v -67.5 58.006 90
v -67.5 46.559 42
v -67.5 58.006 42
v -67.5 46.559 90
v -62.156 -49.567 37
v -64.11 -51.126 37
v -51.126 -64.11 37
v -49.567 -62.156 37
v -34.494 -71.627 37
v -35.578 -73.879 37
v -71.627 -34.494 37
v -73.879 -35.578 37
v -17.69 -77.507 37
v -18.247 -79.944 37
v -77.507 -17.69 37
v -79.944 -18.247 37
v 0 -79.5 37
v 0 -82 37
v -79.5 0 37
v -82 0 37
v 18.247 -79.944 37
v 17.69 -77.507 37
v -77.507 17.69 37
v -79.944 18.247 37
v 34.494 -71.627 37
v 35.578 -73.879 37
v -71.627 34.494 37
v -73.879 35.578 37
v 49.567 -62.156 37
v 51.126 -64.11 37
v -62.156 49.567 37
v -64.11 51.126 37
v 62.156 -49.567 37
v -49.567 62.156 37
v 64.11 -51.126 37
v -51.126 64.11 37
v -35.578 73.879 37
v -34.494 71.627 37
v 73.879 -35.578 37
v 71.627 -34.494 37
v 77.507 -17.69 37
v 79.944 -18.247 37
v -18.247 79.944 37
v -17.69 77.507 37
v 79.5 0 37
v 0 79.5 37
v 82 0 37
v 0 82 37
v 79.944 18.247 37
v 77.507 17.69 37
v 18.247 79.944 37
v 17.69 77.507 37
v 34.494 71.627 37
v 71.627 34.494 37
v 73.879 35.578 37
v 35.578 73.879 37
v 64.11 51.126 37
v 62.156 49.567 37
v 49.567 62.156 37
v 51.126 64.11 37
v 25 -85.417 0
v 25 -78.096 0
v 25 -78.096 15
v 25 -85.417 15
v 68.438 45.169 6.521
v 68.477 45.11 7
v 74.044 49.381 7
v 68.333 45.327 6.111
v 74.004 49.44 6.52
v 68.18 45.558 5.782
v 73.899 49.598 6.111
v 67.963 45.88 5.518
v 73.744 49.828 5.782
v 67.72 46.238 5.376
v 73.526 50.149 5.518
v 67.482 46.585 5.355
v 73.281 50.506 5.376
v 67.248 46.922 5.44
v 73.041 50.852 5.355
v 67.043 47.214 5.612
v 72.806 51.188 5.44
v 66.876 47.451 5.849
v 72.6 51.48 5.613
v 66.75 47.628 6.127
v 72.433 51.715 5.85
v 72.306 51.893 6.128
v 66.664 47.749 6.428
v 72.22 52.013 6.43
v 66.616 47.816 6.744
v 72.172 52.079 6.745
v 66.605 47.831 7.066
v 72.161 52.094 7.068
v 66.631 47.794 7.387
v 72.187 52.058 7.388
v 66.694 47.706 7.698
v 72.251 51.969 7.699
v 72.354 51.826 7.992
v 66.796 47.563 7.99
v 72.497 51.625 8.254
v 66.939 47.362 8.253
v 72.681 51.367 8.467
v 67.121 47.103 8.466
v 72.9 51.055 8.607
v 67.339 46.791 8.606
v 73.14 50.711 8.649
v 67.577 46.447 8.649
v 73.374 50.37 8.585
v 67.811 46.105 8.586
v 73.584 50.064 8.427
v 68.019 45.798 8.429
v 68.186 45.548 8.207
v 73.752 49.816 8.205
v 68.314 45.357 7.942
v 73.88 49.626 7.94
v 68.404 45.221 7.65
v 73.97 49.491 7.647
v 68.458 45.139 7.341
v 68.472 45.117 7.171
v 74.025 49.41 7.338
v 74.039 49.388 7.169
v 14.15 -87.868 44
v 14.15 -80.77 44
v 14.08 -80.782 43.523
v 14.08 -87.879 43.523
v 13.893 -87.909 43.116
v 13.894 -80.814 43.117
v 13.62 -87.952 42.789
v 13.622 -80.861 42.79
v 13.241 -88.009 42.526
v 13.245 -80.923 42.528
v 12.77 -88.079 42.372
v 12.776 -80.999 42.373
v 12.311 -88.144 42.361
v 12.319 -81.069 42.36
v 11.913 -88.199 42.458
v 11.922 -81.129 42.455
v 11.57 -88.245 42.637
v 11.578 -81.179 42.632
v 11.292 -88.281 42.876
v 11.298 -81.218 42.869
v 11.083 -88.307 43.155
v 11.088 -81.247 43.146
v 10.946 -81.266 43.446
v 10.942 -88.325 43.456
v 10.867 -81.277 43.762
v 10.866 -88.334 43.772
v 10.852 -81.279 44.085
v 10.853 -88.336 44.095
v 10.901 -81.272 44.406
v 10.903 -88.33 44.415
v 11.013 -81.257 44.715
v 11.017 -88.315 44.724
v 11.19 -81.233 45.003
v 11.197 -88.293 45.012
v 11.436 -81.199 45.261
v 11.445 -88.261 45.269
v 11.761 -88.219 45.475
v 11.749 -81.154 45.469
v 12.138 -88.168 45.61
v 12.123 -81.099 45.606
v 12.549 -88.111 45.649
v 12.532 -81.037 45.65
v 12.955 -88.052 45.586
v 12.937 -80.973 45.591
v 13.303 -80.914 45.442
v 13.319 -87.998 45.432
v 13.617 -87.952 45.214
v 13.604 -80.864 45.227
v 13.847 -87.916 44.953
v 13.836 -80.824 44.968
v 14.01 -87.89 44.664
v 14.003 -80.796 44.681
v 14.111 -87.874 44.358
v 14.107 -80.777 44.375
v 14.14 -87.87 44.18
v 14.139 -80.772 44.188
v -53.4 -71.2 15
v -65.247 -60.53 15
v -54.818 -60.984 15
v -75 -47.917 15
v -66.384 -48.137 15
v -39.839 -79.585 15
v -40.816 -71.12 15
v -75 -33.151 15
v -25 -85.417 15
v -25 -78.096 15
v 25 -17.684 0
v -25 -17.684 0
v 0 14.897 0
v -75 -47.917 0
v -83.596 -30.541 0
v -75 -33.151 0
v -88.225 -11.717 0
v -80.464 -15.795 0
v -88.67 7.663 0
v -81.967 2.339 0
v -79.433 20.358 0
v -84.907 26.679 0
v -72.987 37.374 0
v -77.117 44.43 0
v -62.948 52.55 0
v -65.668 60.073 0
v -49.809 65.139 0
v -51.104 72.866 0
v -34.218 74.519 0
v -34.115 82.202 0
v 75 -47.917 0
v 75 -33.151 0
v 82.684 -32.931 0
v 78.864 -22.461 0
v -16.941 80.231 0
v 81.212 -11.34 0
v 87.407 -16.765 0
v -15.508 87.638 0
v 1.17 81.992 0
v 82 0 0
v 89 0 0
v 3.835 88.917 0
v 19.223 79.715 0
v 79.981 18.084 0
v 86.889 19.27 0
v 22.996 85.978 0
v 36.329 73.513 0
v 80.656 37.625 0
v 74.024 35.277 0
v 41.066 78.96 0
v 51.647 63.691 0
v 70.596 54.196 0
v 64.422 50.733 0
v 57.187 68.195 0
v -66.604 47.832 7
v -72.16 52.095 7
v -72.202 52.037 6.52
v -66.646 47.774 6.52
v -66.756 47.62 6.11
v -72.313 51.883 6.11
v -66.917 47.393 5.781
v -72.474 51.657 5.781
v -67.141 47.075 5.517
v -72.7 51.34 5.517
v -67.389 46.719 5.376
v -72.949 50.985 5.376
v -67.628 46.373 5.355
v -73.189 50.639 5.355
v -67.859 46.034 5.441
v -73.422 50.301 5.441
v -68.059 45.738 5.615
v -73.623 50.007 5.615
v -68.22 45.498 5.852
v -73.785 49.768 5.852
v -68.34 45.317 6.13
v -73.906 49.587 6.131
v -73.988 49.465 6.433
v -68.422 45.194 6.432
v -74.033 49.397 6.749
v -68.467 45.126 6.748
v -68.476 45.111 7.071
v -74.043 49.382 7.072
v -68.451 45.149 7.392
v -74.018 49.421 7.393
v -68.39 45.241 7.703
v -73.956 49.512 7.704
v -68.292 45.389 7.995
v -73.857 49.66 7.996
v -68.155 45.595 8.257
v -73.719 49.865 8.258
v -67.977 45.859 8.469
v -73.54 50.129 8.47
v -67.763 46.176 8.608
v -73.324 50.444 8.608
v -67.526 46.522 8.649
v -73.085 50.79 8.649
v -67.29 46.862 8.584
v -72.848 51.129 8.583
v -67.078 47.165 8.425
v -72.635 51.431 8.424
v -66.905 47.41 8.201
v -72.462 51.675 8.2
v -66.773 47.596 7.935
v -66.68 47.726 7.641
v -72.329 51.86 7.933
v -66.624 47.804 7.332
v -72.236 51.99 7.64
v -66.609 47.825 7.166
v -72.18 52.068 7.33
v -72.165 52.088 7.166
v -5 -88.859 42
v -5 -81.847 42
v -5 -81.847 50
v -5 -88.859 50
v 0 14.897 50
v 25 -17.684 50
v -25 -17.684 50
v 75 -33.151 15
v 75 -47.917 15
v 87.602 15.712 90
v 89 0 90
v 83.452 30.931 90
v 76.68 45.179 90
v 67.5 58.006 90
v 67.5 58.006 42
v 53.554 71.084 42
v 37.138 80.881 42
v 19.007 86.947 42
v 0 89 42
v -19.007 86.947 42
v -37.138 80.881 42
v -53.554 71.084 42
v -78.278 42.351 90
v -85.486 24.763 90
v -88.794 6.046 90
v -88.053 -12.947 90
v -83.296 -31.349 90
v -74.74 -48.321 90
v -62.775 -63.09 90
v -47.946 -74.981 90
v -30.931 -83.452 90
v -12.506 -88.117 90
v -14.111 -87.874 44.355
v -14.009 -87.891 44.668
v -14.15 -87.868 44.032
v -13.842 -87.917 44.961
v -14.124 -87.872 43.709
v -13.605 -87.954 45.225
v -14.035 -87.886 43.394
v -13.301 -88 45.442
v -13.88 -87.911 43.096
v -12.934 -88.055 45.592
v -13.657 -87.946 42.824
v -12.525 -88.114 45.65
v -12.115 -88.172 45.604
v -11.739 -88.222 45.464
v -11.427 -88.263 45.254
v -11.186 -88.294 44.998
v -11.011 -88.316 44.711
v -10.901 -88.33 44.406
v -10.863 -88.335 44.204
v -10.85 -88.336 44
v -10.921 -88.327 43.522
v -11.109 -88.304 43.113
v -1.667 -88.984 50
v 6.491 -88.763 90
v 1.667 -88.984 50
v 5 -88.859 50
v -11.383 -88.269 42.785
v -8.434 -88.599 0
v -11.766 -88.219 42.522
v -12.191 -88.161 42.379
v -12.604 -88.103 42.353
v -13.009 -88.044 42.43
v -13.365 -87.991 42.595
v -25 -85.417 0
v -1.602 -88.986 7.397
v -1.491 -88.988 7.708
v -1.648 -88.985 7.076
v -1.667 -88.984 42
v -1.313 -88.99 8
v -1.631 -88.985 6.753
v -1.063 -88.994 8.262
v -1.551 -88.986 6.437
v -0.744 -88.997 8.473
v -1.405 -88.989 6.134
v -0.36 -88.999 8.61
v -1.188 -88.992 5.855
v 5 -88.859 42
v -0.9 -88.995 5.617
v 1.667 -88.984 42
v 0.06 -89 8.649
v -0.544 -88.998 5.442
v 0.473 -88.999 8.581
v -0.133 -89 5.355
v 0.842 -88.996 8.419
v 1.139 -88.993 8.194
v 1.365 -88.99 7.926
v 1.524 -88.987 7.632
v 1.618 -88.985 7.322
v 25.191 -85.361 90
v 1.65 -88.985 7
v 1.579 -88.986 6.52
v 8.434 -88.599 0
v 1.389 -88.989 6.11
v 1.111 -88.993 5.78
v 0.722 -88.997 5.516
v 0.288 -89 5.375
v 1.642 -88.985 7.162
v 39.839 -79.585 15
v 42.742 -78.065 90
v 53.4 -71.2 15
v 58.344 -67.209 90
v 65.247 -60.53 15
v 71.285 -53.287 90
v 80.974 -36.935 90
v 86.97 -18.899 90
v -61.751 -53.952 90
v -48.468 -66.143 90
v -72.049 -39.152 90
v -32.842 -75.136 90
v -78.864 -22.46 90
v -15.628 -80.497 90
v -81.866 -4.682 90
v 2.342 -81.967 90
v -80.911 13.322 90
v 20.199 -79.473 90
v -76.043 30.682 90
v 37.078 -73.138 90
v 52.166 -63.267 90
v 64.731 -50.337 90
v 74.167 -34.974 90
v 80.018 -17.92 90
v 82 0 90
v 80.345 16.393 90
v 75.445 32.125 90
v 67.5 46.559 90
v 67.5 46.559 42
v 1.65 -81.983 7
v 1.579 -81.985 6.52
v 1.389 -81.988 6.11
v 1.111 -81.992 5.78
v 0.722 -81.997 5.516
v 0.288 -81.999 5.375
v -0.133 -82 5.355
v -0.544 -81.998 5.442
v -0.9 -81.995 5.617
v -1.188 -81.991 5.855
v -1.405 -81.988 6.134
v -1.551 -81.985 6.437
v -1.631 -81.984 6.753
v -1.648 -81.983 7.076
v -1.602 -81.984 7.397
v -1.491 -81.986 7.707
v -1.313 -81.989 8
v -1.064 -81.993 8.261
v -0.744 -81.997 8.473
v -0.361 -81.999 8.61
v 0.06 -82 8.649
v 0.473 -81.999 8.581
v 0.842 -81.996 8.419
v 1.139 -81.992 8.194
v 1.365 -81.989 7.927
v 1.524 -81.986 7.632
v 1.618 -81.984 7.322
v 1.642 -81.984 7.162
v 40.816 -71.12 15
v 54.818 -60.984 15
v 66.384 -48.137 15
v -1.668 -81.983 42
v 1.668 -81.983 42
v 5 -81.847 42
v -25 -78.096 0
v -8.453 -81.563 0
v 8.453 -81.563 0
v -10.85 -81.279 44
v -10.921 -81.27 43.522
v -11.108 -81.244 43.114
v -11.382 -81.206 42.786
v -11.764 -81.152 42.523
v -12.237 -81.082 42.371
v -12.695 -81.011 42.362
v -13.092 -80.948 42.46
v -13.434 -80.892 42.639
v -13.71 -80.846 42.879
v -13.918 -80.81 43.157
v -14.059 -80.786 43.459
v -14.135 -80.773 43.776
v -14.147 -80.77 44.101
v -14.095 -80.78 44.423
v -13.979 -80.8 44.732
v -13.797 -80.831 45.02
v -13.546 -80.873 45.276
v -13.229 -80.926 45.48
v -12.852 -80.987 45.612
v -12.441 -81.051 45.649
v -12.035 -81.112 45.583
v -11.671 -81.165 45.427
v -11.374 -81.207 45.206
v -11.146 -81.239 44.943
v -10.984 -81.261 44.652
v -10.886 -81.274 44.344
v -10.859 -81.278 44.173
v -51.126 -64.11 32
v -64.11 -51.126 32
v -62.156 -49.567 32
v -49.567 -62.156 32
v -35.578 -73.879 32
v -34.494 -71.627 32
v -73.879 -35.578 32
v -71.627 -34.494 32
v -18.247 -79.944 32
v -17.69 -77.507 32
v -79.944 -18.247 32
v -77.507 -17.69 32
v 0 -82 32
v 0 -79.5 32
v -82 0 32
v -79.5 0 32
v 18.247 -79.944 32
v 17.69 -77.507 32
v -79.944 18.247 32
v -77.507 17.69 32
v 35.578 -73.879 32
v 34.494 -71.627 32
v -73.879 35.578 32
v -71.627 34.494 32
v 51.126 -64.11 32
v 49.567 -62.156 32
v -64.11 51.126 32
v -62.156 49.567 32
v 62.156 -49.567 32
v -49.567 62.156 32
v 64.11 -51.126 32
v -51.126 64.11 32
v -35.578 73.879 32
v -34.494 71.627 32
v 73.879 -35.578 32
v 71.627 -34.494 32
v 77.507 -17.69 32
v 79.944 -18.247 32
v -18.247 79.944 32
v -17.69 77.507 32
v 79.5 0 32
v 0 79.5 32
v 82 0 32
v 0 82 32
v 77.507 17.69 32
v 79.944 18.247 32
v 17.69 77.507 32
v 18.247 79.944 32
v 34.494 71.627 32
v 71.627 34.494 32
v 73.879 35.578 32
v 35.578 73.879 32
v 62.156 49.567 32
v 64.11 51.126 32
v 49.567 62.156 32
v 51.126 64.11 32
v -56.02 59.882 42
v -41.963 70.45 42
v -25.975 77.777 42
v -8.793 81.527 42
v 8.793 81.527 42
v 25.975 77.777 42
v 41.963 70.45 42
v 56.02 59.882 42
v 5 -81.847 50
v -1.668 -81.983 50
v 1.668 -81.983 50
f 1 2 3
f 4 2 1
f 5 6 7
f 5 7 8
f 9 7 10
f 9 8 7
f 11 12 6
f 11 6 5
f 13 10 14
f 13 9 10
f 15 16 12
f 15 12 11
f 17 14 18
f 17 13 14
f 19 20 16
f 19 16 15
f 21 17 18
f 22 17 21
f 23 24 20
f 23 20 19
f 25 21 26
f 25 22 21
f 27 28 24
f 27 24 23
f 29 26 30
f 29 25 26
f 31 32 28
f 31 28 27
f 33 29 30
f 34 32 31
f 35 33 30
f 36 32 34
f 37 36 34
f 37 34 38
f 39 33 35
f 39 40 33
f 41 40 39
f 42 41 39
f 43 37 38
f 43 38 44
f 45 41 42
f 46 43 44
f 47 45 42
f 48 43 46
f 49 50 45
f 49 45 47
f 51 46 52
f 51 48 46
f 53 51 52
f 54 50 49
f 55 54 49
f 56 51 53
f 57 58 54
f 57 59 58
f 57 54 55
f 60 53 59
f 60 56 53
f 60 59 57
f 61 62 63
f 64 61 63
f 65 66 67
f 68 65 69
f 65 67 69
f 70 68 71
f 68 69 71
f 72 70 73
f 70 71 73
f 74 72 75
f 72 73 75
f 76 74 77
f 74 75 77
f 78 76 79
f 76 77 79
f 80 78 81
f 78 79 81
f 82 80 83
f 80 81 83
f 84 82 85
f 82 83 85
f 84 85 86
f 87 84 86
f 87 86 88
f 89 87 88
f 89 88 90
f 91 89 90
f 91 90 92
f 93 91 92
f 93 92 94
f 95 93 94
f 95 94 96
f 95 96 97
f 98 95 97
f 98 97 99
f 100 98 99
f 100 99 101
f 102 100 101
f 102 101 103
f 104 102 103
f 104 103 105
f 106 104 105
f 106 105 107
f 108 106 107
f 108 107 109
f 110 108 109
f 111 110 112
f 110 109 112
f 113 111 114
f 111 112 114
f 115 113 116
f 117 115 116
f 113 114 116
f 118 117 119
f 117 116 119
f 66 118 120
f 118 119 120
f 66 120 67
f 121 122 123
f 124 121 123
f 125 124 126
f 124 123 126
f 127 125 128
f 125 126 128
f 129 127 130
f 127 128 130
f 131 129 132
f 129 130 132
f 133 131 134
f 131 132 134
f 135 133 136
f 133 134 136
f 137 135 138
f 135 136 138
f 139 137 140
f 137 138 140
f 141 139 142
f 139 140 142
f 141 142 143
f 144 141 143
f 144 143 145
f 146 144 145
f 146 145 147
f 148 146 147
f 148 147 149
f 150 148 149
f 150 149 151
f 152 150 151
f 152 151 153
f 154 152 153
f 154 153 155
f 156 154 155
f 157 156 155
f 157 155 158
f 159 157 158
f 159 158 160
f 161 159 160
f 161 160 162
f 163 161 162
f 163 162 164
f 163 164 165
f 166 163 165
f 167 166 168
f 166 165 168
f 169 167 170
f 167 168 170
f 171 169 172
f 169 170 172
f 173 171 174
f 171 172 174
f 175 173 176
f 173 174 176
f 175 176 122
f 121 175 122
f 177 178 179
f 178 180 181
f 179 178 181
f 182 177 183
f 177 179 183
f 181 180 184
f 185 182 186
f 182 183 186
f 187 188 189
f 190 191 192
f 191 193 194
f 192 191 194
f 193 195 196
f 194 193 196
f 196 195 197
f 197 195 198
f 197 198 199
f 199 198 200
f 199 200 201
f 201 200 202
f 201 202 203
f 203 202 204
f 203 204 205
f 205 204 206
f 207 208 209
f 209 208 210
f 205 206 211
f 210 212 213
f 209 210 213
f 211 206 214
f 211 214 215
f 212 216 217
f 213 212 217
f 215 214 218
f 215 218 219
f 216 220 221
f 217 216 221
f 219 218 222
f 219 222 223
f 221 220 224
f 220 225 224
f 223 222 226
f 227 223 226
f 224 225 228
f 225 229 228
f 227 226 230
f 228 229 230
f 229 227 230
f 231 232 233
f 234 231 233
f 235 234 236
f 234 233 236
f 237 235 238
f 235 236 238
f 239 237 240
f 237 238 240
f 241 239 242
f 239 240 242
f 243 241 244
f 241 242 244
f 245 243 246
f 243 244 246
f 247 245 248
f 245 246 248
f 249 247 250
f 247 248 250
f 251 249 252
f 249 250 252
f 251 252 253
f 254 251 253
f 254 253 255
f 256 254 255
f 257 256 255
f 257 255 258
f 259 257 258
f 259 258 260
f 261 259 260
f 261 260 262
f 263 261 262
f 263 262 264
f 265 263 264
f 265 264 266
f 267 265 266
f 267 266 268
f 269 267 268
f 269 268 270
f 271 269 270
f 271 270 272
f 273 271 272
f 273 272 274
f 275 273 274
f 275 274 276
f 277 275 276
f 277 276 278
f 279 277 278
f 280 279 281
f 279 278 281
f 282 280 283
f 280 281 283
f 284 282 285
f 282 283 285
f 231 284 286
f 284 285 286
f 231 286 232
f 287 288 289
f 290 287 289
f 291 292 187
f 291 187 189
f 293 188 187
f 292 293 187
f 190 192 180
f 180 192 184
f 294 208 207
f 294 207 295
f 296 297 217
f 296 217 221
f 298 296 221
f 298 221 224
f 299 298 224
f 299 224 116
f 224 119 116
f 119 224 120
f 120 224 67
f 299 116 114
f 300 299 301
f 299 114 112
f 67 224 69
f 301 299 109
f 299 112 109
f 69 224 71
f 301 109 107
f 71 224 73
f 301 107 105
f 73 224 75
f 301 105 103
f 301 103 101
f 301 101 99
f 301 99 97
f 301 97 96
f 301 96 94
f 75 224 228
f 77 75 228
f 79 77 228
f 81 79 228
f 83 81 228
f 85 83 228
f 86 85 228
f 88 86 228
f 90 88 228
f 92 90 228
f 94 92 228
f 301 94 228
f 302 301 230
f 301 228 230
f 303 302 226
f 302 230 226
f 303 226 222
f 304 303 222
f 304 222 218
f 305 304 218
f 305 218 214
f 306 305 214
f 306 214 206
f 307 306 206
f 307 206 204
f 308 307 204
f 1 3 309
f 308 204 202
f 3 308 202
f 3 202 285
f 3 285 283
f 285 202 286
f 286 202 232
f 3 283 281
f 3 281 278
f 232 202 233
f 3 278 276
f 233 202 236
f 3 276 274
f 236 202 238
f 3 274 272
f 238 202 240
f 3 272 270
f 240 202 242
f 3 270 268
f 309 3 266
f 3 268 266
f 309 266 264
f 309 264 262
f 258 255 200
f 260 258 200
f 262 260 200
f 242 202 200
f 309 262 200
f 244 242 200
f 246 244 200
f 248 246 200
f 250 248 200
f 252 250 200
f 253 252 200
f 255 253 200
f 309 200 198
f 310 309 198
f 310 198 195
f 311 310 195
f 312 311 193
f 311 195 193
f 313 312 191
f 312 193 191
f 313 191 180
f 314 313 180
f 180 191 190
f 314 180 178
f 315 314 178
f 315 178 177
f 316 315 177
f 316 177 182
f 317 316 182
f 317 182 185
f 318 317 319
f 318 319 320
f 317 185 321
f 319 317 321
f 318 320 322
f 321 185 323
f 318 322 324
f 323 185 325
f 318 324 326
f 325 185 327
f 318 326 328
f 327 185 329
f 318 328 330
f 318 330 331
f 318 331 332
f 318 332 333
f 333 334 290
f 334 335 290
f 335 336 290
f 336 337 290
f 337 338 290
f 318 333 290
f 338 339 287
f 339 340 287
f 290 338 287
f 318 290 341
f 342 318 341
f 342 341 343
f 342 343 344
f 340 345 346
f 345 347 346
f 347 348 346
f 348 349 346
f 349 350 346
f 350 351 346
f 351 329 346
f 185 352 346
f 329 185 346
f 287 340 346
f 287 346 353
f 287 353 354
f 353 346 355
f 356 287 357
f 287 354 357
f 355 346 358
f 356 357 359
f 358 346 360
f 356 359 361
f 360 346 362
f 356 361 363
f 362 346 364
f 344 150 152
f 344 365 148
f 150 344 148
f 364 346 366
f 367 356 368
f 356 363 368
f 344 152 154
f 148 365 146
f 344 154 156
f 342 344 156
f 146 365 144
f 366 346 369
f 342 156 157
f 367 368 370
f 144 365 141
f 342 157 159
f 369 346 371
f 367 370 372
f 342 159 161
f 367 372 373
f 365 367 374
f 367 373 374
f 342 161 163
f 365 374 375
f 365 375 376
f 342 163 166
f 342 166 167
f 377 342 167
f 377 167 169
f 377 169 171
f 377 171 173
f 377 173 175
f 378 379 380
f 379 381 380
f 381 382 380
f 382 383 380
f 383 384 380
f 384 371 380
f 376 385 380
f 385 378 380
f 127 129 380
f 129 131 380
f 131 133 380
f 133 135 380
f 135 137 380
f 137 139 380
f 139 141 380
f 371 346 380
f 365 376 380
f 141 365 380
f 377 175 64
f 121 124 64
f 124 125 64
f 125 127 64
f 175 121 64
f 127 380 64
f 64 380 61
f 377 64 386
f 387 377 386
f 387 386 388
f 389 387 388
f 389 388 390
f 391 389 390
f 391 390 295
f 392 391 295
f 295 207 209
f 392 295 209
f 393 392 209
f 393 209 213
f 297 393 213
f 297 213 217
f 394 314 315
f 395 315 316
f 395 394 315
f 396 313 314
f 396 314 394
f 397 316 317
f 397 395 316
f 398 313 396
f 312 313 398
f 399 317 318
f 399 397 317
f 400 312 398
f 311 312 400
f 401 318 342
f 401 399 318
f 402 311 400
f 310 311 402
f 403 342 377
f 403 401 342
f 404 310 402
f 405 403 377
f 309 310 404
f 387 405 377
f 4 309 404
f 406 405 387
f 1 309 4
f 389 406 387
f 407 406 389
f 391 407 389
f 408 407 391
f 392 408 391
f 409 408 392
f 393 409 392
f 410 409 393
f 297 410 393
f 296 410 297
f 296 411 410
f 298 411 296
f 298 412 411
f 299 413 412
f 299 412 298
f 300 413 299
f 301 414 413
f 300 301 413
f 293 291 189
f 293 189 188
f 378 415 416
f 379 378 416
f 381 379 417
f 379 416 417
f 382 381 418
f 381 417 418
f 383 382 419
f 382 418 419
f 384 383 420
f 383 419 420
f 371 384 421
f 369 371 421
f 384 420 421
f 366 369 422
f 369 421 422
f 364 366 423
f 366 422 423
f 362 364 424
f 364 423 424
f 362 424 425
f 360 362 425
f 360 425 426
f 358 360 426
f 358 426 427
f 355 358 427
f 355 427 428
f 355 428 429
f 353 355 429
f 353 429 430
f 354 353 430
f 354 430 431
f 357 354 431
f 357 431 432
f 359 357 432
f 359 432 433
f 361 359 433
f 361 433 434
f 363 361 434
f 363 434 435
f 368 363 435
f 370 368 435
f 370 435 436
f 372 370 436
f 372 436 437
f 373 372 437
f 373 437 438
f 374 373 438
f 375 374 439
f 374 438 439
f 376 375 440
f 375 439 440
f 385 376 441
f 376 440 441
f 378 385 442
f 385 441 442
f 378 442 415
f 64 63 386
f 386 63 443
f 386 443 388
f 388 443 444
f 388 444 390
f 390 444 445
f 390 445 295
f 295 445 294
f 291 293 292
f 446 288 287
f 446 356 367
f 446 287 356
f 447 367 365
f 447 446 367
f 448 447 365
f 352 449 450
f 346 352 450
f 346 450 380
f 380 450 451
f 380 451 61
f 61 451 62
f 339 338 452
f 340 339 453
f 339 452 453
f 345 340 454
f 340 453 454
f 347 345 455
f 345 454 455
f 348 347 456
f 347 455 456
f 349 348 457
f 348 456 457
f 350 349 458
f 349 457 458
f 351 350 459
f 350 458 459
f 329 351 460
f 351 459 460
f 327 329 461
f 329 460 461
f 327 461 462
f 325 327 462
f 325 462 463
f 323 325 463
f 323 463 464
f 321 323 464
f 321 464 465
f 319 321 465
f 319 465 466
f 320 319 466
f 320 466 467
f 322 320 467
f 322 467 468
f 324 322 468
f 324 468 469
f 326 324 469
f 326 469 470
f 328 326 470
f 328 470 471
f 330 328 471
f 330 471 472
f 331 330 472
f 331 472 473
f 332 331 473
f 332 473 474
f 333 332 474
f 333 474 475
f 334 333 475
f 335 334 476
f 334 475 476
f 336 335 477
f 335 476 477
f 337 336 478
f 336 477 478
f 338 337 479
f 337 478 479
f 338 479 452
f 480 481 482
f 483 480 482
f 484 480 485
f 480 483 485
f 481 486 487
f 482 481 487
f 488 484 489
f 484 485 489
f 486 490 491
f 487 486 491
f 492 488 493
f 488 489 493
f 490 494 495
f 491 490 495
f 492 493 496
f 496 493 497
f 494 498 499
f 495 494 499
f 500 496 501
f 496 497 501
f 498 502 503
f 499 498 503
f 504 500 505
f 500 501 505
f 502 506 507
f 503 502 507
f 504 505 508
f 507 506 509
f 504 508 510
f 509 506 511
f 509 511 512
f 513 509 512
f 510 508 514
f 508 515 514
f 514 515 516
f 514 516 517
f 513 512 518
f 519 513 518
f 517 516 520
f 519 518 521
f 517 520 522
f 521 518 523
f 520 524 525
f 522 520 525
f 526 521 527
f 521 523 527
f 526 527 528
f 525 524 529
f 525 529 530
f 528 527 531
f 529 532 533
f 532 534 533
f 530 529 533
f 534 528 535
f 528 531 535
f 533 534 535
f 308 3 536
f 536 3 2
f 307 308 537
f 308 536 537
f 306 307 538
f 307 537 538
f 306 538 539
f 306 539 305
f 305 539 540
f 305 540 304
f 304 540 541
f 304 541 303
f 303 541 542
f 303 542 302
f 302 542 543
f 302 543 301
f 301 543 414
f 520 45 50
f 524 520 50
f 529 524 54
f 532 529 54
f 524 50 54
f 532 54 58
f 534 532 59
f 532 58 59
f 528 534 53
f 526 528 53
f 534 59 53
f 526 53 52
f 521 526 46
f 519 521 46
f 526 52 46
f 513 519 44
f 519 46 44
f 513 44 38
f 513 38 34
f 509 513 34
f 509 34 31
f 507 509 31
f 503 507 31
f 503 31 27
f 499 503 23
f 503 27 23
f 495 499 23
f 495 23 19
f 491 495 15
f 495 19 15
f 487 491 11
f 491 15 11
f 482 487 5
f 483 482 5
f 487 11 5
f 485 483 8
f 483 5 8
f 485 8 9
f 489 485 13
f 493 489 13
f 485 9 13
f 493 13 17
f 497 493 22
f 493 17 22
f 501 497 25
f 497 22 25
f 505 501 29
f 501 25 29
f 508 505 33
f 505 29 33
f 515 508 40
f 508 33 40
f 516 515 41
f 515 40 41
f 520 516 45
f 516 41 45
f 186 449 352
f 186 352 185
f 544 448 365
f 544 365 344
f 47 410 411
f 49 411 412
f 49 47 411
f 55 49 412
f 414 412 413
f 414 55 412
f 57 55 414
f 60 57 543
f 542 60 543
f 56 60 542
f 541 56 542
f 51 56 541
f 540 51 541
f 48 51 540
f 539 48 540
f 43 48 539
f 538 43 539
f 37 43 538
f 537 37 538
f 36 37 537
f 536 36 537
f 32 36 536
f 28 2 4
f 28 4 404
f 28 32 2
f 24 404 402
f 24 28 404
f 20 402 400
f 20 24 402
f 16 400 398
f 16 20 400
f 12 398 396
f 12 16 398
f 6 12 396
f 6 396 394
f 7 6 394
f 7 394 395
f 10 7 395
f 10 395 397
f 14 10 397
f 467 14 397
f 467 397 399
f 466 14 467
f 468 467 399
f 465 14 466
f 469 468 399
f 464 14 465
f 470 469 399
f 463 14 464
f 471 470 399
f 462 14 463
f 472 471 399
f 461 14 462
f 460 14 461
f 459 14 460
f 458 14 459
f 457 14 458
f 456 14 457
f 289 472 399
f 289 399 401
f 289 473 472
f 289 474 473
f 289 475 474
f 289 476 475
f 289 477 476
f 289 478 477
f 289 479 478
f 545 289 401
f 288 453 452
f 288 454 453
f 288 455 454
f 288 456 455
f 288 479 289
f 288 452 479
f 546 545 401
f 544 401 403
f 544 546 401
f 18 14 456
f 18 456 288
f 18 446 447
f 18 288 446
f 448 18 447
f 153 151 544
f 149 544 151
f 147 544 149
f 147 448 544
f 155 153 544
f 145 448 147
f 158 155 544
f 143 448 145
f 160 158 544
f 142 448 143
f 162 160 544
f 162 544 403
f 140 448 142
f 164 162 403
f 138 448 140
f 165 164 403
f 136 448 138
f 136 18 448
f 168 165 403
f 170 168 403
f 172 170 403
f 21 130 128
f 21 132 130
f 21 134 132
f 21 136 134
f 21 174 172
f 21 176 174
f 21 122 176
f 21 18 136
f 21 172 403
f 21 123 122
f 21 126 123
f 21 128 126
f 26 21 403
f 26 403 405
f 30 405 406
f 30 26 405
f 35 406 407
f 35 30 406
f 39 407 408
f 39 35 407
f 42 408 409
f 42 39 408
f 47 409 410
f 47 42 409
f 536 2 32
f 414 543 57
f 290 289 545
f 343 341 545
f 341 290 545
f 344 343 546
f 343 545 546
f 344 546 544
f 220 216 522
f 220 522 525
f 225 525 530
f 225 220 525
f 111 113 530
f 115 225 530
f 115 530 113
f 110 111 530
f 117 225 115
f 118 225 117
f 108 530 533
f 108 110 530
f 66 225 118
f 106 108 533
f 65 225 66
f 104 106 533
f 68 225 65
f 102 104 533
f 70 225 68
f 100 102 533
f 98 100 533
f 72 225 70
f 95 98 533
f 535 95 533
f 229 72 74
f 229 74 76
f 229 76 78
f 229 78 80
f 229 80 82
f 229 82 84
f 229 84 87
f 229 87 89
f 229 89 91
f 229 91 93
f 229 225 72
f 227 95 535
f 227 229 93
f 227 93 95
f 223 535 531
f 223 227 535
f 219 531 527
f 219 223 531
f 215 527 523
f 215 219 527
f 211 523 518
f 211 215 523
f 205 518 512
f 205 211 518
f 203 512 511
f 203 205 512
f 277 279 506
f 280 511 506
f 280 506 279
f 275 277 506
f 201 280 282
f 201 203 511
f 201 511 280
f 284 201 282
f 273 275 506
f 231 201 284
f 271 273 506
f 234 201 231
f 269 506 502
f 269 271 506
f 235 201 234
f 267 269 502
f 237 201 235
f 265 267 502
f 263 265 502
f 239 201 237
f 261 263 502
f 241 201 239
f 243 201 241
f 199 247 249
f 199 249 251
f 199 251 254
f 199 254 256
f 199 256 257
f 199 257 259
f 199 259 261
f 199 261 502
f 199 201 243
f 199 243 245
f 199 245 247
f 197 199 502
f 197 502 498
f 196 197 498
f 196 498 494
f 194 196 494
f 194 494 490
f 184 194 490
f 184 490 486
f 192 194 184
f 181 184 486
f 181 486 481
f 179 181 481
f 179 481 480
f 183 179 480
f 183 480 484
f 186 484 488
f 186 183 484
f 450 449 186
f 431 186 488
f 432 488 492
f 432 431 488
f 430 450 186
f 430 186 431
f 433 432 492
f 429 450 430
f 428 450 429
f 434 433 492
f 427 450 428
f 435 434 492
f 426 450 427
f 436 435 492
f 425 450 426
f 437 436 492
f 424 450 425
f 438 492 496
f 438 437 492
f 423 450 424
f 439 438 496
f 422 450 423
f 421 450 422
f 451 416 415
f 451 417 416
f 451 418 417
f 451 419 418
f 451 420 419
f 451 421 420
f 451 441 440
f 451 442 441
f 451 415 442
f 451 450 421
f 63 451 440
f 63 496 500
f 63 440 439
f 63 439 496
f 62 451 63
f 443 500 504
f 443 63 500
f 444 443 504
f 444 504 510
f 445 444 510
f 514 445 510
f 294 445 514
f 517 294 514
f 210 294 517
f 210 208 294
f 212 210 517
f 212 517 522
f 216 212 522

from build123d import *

# Parameters (mm, degrees)
F0_R      = 89
F0_R_2    = 82
F1_DEPTH  = 90
F2_W      = 135
F2_H      = 48
F3_DEPTH  = 130
F4_W      = 10
F4_H      = 8
F5_DEPTH  = 100
F7_D      = 3.3
F7_DEPTH  = 89.001
F9_START  = -5
F8_R      = 82
F8_R_2    = 79.5
F9_DEPTH  = 5
F10_W     = 50
F10_H     = 15
F11_DEPTH = 152.2
F13_DEPTH = 50
F15_D     = 3.3
F17_D     = 3.3


with BuildPart() as f1:
    # F0 (on Top) → F1 (new body)
    with BuildSketch(Plane.XY):
        Circle(F0_R)
        Circle(F0_R_2, mode=Mode.SUBTRACT)
    extrude(amount=F1_DEPTH)

    # F2 (on Front) → F3 (cut)
    with BuildSketch(Plane.XZ):
        with Locations((0, 66)):
            Rectangle(F2_W, F2_H)
    extrude(amount=-F3_DEPTH, mode=Mode.SUBTRACT)

    # F4 (on Front) → F5 (cut)
    with BuildSketch(Plane.XZ):
        with Locations((0, 46)):
            Rectangle(F4_W, F4_H)
    extrude(amount=F5_DEPTH, mode=Mode.SUBTRACT)

    # F7 (through all, one way)
    with BuildSketch(Plane(origin=(0, 0, 0), x_dir=(1, 0, 0), z_dir=(0, 1, 0))):
        with Locations((-12.5, -44), (12.5, -44), (0, -7)):
            Circle(F7_D / 2)
    extrude(amount=-F7_DEPTH, mode=Mode.SUBTRACT)

    # F8 (on face) → F9 (join)
    with BuildSketch(Plane.XY.offset(42).offset(F9_START)):
        Circle(F8_R)
        Circle(F8_R_2, mode=Mode.SUBTRACT)
    extrude(amount=-F9_DEPTH)

    # F10 (on Front) → F11 (cut)
    with BuildSketch(Plane.XZ):
        with Locations((-50, 7.5)):
            Rectangle(F10_W, F10_H)
        with Locations((50, 7.5)):
            Rectangle(F10_W, F10_H)
    extrude(amount=F11_DEPTH, mode=Mode.SUBTRACT)

    # F15 (through all)
    with Locations(Plane(origin=(-7.1946598354, 5.520656661, 0), x_dir=(-0.608761429, -0.7933533403, 0), z_dir=(0.7933533403, -0.608761429, 0))):
        with Locations((4.248469624, -7)):
            Hole(F15_D / 2)

    # F17 (through all)
    with Locations(Plane(origin=(7.1946598354, 5.520656661, 0), x_dir=(-0.608761429, 0.7933533403, 0), z_dir=(-0.7933533403, -0.608761429, 0))):
        with Locations((-4.248469624, -7)):
            Hole(F17_D / 2)


with BuildPart() as f13:
    # F12 (on Top) → F13 (new body)
    with BuildSketch(Plane.XY):
        Polygon((0, 14.8969199074), (-25, -17.6837144136), (25, -17.6837144136), align=None)
    extrude(amount=F13_DEPTH)


solid = Compound([f1.part, f13.part])
